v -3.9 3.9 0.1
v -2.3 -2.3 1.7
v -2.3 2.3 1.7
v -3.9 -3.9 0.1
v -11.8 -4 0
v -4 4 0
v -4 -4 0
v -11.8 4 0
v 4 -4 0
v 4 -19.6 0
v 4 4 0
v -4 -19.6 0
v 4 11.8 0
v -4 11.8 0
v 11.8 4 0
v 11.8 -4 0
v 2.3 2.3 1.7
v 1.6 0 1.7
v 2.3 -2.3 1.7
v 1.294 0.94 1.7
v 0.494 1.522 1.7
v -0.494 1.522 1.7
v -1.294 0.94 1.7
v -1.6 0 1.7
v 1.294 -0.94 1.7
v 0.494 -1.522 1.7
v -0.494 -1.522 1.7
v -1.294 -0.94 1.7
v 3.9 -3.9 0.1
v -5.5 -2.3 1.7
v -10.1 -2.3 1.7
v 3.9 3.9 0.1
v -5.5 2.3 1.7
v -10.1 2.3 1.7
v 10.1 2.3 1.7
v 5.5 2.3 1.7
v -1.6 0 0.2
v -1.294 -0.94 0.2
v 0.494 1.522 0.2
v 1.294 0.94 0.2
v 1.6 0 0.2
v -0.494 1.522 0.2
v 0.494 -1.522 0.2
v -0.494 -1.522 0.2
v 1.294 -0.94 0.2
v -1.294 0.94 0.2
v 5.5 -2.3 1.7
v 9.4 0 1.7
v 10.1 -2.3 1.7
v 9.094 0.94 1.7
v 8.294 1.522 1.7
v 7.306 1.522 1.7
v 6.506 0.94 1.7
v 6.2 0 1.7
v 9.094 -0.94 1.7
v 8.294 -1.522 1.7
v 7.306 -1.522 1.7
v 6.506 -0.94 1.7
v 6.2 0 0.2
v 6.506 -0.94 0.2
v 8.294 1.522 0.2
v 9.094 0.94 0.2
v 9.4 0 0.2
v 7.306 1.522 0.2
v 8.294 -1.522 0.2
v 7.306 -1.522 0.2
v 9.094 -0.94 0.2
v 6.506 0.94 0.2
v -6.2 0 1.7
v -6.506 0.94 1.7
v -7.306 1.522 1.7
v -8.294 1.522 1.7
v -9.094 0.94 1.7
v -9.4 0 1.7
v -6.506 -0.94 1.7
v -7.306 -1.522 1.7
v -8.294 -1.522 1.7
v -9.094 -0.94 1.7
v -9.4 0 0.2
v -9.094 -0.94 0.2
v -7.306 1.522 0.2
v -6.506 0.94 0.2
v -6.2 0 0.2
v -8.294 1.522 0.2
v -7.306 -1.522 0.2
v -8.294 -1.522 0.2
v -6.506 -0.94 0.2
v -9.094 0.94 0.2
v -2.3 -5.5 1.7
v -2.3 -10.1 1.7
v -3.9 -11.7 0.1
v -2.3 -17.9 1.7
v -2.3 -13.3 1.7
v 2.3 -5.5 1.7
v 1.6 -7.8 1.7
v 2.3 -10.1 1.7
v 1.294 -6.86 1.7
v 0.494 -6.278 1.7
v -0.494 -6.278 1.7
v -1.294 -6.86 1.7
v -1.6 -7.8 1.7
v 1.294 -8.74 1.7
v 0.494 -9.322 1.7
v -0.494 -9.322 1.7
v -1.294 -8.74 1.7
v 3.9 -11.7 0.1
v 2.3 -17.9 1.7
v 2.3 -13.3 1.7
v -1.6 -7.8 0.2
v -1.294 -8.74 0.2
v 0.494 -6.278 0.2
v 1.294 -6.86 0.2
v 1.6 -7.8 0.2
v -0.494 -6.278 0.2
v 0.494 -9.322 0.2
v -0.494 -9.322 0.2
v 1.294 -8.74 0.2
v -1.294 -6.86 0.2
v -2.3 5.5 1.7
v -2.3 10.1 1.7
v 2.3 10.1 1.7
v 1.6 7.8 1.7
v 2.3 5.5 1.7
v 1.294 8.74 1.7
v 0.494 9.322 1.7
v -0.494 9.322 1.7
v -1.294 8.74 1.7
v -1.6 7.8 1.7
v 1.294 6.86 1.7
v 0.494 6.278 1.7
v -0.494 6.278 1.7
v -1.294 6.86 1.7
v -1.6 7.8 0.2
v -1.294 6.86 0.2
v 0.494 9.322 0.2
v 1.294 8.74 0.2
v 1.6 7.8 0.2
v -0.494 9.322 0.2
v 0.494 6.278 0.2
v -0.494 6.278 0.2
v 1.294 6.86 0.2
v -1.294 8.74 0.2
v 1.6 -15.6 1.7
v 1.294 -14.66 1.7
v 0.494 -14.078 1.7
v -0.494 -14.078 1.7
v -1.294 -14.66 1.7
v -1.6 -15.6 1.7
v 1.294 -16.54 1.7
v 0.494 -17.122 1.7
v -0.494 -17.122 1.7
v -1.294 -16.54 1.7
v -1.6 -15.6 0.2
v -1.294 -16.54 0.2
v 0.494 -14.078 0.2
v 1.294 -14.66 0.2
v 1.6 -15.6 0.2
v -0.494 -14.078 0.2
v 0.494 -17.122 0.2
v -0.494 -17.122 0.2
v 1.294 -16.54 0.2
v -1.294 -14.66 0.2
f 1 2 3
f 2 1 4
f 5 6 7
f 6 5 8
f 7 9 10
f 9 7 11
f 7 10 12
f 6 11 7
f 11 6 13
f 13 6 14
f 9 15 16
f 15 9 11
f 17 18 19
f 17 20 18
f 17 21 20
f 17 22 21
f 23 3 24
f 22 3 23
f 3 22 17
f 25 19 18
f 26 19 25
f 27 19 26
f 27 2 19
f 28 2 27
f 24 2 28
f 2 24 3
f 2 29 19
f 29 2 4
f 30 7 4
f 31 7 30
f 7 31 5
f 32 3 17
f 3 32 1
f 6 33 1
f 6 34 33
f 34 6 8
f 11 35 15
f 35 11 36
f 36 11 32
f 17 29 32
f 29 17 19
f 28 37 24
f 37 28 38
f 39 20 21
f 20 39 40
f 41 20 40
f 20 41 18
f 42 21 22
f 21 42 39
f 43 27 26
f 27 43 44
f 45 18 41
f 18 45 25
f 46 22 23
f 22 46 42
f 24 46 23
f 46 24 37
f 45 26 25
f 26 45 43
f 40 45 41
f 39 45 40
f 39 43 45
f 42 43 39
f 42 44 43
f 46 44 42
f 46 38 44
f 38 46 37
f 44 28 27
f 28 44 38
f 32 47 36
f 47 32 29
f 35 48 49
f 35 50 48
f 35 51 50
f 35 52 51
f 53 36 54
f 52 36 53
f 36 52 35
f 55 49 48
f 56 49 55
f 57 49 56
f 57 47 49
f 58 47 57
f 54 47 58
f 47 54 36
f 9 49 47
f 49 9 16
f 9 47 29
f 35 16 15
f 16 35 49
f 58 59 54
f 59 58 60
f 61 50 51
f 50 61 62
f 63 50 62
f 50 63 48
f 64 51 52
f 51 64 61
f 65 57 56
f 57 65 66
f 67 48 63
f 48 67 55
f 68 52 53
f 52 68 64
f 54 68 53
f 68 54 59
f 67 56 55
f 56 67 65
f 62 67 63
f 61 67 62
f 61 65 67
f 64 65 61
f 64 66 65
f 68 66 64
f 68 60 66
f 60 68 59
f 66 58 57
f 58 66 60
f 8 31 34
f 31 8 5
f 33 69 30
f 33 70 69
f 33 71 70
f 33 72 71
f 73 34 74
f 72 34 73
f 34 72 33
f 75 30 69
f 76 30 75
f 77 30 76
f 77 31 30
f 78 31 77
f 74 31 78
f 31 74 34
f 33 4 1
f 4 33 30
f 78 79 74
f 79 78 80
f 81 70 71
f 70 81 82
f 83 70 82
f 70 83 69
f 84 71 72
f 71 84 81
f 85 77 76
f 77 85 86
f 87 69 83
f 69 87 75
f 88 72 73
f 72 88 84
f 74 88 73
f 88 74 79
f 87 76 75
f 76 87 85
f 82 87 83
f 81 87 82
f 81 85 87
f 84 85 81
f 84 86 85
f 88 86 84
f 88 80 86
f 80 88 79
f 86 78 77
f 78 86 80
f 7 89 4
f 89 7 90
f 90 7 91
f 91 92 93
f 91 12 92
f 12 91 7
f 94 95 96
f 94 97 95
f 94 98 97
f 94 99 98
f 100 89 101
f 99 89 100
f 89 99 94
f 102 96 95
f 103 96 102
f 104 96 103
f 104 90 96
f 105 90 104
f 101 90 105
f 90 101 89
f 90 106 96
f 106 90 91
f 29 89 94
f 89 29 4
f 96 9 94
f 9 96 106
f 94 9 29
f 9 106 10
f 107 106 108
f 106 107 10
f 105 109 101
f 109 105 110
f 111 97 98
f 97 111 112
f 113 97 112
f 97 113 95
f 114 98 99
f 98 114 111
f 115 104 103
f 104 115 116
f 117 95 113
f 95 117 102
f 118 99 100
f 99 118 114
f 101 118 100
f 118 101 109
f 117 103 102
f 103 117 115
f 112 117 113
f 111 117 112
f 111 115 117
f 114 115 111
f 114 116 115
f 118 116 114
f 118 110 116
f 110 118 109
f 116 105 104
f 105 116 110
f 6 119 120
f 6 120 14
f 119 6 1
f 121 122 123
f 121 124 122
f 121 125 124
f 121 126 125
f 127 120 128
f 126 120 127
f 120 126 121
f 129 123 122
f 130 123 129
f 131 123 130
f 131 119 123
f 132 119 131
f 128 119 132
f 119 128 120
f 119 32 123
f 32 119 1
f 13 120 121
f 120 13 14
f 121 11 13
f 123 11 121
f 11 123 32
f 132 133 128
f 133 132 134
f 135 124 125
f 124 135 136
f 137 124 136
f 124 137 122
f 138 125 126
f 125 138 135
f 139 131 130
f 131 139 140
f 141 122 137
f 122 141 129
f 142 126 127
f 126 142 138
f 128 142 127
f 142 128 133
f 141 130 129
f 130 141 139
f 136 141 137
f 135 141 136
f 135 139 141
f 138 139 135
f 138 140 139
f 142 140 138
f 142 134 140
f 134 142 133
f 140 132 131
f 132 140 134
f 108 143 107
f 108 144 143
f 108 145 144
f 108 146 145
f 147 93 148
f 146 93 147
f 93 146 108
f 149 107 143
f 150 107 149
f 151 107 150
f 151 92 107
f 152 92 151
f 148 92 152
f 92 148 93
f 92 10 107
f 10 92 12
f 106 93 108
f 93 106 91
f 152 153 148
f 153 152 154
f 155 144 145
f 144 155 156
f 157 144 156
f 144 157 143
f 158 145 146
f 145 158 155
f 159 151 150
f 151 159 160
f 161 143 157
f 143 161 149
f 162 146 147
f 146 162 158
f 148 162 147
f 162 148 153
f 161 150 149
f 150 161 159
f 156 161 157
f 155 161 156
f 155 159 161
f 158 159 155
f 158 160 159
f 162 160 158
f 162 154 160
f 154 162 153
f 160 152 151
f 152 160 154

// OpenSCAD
r = 3/2 + 0.1;
d = 1.2 + 0.3;

w = 5*r;
t=d+0.2;

module face(){
    difference(){
        hull(){
            cube([w, w, 0.001], center=true);
            translate([0, 0, t])
            cube([w - 2*t, w - 2*t, 0.001], center=true);
        }
        translate([0, 0, t-d])
        cylinder(d+0.001, r, r, $fn=10);
    }
}


overlap = 0.2;
wo = w - overlap;
for (offs = [[0, 0], [1, 0], [-1, 0], [0, -1], [0, 1], [0, -2]]){
    translate([offs.x*wo, offs.y*wo, 0])
    face();
}
